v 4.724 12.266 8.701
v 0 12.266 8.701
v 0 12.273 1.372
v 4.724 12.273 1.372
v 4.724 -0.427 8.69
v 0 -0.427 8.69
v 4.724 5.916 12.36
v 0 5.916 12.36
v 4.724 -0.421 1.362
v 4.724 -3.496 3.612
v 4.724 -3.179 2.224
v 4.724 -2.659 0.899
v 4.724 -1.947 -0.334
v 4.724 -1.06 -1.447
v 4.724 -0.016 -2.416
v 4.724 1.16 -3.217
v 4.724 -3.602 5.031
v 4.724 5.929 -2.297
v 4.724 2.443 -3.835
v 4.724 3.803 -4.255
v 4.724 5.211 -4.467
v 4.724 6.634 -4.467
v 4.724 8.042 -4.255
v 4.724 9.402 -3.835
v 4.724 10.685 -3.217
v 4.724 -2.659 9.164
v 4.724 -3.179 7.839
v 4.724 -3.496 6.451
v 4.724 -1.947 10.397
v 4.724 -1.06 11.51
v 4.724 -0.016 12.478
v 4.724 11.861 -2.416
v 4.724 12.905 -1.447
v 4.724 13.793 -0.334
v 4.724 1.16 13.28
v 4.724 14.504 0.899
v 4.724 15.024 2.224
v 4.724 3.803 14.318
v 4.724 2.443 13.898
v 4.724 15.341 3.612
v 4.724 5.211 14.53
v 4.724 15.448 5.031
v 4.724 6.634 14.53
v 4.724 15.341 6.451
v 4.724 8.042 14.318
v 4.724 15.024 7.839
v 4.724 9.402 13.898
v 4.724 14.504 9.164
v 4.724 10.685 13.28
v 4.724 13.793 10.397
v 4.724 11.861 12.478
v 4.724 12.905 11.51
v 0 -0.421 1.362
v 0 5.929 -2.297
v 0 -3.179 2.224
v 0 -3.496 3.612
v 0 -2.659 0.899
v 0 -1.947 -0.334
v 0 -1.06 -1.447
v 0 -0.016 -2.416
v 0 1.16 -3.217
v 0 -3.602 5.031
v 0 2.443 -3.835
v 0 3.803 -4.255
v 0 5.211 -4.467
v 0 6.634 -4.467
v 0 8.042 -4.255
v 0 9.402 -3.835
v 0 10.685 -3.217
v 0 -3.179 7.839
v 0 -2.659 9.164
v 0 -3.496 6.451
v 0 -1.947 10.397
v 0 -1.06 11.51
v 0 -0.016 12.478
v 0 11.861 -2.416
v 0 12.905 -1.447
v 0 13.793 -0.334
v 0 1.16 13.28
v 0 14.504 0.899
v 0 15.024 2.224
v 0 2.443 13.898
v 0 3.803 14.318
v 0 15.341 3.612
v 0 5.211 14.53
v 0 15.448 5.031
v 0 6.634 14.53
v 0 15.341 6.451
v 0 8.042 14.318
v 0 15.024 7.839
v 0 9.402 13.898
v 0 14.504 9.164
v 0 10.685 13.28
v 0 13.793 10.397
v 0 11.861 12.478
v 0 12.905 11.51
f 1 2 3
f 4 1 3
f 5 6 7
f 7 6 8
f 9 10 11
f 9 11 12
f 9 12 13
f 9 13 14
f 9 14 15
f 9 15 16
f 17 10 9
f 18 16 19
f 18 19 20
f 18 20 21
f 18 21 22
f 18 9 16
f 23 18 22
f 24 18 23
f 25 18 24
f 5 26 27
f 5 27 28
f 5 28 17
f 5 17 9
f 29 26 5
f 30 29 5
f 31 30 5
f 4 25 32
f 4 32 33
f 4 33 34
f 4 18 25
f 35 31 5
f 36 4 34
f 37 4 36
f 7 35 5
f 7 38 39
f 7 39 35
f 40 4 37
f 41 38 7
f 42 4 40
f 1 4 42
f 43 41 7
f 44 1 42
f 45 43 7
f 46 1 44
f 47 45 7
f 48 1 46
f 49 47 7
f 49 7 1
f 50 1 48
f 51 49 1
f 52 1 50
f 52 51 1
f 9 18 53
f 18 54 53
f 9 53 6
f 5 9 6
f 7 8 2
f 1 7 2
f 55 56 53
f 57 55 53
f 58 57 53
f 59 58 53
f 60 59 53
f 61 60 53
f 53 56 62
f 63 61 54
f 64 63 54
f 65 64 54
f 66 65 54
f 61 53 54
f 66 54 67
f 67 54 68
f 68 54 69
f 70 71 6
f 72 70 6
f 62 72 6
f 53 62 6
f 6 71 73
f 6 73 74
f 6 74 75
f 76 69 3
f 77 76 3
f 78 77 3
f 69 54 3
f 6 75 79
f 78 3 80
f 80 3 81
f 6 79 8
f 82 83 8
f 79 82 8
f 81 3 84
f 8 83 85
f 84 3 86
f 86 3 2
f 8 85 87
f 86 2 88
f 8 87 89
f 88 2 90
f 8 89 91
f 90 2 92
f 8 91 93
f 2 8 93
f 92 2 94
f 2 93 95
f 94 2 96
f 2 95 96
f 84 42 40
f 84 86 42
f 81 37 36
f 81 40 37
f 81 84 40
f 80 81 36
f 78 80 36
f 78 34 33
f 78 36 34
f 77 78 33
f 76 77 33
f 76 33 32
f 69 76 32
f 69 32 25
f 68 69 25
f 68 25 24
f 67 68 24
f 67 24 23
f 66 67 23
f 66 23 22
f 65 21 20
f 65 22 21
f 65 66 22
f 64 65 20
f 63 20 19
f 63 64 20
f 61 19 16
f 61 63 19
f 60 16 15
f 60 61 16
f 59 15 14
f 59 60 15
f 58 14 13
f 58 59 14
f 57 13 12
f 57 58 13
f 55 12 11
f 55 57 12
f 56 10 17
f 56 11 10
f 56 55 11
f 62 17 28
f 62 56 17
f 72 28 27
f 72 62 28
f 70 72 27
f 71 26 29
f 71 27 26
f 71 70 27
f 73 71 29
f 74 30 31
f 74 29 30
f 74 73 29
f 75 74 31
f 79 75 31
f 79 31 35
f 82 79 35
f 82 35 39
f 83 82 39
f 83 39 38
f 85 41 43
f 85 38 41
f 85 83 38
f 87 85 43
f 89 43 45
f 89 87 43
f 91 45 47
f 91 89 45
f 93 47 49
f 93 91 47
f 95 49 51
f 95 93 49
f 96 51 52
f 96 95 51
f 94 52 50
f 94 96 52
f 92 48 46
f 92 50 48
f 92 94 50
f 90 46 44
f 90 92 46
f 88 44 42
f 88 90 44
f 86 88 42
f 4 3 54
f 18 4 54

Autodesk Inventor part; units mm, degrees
ref_plane "YZ Plane" through (0, 0, 0) normal (1, 0, 0) x (0, 1, 0)
ref_plane "XZ Plane" through (0, 0, 0) normal (0, 1, 0) x (-1, 0, 0)
ref_plane "XY Plane" through (0, 0, 0) normal (0, 0, 1) x (1, 0, 0)
sketch "Sketch1" plane through (0, 0, 0) normal (1, 0, 0) x (0, 1, 0)
  circle A0 centre (5.9226, 5.0314) radius 9.525
  line L0 (5.9226, 5.0314) -> (12.2726, 5.0314) construction
  line L1 (12.2726, 1.3724) -> (5.9287, -2.2974)
  line L2 (5.9287, -2.2974) -> (-0.4213, 1.3617)
  line L3 (-0.4213, 1.3617) -> (-0.4274, 8.6905)
  line L4 (-0.4274, 8.6905) -> (5.9164, 12.3602)
  line L5 (5.9164, 12.3602) -> (12.2664, 8.7012)
  line L6 (12.2664, 8.7012) -> (12.2726, 1.3724)
  point P0 (0, 0)
  dimension "d0" = 19.05
extrude "Extrusion1" add sketch "Sketch1" along normal blind 4.7244
properties part number "3D Model Spacer"
